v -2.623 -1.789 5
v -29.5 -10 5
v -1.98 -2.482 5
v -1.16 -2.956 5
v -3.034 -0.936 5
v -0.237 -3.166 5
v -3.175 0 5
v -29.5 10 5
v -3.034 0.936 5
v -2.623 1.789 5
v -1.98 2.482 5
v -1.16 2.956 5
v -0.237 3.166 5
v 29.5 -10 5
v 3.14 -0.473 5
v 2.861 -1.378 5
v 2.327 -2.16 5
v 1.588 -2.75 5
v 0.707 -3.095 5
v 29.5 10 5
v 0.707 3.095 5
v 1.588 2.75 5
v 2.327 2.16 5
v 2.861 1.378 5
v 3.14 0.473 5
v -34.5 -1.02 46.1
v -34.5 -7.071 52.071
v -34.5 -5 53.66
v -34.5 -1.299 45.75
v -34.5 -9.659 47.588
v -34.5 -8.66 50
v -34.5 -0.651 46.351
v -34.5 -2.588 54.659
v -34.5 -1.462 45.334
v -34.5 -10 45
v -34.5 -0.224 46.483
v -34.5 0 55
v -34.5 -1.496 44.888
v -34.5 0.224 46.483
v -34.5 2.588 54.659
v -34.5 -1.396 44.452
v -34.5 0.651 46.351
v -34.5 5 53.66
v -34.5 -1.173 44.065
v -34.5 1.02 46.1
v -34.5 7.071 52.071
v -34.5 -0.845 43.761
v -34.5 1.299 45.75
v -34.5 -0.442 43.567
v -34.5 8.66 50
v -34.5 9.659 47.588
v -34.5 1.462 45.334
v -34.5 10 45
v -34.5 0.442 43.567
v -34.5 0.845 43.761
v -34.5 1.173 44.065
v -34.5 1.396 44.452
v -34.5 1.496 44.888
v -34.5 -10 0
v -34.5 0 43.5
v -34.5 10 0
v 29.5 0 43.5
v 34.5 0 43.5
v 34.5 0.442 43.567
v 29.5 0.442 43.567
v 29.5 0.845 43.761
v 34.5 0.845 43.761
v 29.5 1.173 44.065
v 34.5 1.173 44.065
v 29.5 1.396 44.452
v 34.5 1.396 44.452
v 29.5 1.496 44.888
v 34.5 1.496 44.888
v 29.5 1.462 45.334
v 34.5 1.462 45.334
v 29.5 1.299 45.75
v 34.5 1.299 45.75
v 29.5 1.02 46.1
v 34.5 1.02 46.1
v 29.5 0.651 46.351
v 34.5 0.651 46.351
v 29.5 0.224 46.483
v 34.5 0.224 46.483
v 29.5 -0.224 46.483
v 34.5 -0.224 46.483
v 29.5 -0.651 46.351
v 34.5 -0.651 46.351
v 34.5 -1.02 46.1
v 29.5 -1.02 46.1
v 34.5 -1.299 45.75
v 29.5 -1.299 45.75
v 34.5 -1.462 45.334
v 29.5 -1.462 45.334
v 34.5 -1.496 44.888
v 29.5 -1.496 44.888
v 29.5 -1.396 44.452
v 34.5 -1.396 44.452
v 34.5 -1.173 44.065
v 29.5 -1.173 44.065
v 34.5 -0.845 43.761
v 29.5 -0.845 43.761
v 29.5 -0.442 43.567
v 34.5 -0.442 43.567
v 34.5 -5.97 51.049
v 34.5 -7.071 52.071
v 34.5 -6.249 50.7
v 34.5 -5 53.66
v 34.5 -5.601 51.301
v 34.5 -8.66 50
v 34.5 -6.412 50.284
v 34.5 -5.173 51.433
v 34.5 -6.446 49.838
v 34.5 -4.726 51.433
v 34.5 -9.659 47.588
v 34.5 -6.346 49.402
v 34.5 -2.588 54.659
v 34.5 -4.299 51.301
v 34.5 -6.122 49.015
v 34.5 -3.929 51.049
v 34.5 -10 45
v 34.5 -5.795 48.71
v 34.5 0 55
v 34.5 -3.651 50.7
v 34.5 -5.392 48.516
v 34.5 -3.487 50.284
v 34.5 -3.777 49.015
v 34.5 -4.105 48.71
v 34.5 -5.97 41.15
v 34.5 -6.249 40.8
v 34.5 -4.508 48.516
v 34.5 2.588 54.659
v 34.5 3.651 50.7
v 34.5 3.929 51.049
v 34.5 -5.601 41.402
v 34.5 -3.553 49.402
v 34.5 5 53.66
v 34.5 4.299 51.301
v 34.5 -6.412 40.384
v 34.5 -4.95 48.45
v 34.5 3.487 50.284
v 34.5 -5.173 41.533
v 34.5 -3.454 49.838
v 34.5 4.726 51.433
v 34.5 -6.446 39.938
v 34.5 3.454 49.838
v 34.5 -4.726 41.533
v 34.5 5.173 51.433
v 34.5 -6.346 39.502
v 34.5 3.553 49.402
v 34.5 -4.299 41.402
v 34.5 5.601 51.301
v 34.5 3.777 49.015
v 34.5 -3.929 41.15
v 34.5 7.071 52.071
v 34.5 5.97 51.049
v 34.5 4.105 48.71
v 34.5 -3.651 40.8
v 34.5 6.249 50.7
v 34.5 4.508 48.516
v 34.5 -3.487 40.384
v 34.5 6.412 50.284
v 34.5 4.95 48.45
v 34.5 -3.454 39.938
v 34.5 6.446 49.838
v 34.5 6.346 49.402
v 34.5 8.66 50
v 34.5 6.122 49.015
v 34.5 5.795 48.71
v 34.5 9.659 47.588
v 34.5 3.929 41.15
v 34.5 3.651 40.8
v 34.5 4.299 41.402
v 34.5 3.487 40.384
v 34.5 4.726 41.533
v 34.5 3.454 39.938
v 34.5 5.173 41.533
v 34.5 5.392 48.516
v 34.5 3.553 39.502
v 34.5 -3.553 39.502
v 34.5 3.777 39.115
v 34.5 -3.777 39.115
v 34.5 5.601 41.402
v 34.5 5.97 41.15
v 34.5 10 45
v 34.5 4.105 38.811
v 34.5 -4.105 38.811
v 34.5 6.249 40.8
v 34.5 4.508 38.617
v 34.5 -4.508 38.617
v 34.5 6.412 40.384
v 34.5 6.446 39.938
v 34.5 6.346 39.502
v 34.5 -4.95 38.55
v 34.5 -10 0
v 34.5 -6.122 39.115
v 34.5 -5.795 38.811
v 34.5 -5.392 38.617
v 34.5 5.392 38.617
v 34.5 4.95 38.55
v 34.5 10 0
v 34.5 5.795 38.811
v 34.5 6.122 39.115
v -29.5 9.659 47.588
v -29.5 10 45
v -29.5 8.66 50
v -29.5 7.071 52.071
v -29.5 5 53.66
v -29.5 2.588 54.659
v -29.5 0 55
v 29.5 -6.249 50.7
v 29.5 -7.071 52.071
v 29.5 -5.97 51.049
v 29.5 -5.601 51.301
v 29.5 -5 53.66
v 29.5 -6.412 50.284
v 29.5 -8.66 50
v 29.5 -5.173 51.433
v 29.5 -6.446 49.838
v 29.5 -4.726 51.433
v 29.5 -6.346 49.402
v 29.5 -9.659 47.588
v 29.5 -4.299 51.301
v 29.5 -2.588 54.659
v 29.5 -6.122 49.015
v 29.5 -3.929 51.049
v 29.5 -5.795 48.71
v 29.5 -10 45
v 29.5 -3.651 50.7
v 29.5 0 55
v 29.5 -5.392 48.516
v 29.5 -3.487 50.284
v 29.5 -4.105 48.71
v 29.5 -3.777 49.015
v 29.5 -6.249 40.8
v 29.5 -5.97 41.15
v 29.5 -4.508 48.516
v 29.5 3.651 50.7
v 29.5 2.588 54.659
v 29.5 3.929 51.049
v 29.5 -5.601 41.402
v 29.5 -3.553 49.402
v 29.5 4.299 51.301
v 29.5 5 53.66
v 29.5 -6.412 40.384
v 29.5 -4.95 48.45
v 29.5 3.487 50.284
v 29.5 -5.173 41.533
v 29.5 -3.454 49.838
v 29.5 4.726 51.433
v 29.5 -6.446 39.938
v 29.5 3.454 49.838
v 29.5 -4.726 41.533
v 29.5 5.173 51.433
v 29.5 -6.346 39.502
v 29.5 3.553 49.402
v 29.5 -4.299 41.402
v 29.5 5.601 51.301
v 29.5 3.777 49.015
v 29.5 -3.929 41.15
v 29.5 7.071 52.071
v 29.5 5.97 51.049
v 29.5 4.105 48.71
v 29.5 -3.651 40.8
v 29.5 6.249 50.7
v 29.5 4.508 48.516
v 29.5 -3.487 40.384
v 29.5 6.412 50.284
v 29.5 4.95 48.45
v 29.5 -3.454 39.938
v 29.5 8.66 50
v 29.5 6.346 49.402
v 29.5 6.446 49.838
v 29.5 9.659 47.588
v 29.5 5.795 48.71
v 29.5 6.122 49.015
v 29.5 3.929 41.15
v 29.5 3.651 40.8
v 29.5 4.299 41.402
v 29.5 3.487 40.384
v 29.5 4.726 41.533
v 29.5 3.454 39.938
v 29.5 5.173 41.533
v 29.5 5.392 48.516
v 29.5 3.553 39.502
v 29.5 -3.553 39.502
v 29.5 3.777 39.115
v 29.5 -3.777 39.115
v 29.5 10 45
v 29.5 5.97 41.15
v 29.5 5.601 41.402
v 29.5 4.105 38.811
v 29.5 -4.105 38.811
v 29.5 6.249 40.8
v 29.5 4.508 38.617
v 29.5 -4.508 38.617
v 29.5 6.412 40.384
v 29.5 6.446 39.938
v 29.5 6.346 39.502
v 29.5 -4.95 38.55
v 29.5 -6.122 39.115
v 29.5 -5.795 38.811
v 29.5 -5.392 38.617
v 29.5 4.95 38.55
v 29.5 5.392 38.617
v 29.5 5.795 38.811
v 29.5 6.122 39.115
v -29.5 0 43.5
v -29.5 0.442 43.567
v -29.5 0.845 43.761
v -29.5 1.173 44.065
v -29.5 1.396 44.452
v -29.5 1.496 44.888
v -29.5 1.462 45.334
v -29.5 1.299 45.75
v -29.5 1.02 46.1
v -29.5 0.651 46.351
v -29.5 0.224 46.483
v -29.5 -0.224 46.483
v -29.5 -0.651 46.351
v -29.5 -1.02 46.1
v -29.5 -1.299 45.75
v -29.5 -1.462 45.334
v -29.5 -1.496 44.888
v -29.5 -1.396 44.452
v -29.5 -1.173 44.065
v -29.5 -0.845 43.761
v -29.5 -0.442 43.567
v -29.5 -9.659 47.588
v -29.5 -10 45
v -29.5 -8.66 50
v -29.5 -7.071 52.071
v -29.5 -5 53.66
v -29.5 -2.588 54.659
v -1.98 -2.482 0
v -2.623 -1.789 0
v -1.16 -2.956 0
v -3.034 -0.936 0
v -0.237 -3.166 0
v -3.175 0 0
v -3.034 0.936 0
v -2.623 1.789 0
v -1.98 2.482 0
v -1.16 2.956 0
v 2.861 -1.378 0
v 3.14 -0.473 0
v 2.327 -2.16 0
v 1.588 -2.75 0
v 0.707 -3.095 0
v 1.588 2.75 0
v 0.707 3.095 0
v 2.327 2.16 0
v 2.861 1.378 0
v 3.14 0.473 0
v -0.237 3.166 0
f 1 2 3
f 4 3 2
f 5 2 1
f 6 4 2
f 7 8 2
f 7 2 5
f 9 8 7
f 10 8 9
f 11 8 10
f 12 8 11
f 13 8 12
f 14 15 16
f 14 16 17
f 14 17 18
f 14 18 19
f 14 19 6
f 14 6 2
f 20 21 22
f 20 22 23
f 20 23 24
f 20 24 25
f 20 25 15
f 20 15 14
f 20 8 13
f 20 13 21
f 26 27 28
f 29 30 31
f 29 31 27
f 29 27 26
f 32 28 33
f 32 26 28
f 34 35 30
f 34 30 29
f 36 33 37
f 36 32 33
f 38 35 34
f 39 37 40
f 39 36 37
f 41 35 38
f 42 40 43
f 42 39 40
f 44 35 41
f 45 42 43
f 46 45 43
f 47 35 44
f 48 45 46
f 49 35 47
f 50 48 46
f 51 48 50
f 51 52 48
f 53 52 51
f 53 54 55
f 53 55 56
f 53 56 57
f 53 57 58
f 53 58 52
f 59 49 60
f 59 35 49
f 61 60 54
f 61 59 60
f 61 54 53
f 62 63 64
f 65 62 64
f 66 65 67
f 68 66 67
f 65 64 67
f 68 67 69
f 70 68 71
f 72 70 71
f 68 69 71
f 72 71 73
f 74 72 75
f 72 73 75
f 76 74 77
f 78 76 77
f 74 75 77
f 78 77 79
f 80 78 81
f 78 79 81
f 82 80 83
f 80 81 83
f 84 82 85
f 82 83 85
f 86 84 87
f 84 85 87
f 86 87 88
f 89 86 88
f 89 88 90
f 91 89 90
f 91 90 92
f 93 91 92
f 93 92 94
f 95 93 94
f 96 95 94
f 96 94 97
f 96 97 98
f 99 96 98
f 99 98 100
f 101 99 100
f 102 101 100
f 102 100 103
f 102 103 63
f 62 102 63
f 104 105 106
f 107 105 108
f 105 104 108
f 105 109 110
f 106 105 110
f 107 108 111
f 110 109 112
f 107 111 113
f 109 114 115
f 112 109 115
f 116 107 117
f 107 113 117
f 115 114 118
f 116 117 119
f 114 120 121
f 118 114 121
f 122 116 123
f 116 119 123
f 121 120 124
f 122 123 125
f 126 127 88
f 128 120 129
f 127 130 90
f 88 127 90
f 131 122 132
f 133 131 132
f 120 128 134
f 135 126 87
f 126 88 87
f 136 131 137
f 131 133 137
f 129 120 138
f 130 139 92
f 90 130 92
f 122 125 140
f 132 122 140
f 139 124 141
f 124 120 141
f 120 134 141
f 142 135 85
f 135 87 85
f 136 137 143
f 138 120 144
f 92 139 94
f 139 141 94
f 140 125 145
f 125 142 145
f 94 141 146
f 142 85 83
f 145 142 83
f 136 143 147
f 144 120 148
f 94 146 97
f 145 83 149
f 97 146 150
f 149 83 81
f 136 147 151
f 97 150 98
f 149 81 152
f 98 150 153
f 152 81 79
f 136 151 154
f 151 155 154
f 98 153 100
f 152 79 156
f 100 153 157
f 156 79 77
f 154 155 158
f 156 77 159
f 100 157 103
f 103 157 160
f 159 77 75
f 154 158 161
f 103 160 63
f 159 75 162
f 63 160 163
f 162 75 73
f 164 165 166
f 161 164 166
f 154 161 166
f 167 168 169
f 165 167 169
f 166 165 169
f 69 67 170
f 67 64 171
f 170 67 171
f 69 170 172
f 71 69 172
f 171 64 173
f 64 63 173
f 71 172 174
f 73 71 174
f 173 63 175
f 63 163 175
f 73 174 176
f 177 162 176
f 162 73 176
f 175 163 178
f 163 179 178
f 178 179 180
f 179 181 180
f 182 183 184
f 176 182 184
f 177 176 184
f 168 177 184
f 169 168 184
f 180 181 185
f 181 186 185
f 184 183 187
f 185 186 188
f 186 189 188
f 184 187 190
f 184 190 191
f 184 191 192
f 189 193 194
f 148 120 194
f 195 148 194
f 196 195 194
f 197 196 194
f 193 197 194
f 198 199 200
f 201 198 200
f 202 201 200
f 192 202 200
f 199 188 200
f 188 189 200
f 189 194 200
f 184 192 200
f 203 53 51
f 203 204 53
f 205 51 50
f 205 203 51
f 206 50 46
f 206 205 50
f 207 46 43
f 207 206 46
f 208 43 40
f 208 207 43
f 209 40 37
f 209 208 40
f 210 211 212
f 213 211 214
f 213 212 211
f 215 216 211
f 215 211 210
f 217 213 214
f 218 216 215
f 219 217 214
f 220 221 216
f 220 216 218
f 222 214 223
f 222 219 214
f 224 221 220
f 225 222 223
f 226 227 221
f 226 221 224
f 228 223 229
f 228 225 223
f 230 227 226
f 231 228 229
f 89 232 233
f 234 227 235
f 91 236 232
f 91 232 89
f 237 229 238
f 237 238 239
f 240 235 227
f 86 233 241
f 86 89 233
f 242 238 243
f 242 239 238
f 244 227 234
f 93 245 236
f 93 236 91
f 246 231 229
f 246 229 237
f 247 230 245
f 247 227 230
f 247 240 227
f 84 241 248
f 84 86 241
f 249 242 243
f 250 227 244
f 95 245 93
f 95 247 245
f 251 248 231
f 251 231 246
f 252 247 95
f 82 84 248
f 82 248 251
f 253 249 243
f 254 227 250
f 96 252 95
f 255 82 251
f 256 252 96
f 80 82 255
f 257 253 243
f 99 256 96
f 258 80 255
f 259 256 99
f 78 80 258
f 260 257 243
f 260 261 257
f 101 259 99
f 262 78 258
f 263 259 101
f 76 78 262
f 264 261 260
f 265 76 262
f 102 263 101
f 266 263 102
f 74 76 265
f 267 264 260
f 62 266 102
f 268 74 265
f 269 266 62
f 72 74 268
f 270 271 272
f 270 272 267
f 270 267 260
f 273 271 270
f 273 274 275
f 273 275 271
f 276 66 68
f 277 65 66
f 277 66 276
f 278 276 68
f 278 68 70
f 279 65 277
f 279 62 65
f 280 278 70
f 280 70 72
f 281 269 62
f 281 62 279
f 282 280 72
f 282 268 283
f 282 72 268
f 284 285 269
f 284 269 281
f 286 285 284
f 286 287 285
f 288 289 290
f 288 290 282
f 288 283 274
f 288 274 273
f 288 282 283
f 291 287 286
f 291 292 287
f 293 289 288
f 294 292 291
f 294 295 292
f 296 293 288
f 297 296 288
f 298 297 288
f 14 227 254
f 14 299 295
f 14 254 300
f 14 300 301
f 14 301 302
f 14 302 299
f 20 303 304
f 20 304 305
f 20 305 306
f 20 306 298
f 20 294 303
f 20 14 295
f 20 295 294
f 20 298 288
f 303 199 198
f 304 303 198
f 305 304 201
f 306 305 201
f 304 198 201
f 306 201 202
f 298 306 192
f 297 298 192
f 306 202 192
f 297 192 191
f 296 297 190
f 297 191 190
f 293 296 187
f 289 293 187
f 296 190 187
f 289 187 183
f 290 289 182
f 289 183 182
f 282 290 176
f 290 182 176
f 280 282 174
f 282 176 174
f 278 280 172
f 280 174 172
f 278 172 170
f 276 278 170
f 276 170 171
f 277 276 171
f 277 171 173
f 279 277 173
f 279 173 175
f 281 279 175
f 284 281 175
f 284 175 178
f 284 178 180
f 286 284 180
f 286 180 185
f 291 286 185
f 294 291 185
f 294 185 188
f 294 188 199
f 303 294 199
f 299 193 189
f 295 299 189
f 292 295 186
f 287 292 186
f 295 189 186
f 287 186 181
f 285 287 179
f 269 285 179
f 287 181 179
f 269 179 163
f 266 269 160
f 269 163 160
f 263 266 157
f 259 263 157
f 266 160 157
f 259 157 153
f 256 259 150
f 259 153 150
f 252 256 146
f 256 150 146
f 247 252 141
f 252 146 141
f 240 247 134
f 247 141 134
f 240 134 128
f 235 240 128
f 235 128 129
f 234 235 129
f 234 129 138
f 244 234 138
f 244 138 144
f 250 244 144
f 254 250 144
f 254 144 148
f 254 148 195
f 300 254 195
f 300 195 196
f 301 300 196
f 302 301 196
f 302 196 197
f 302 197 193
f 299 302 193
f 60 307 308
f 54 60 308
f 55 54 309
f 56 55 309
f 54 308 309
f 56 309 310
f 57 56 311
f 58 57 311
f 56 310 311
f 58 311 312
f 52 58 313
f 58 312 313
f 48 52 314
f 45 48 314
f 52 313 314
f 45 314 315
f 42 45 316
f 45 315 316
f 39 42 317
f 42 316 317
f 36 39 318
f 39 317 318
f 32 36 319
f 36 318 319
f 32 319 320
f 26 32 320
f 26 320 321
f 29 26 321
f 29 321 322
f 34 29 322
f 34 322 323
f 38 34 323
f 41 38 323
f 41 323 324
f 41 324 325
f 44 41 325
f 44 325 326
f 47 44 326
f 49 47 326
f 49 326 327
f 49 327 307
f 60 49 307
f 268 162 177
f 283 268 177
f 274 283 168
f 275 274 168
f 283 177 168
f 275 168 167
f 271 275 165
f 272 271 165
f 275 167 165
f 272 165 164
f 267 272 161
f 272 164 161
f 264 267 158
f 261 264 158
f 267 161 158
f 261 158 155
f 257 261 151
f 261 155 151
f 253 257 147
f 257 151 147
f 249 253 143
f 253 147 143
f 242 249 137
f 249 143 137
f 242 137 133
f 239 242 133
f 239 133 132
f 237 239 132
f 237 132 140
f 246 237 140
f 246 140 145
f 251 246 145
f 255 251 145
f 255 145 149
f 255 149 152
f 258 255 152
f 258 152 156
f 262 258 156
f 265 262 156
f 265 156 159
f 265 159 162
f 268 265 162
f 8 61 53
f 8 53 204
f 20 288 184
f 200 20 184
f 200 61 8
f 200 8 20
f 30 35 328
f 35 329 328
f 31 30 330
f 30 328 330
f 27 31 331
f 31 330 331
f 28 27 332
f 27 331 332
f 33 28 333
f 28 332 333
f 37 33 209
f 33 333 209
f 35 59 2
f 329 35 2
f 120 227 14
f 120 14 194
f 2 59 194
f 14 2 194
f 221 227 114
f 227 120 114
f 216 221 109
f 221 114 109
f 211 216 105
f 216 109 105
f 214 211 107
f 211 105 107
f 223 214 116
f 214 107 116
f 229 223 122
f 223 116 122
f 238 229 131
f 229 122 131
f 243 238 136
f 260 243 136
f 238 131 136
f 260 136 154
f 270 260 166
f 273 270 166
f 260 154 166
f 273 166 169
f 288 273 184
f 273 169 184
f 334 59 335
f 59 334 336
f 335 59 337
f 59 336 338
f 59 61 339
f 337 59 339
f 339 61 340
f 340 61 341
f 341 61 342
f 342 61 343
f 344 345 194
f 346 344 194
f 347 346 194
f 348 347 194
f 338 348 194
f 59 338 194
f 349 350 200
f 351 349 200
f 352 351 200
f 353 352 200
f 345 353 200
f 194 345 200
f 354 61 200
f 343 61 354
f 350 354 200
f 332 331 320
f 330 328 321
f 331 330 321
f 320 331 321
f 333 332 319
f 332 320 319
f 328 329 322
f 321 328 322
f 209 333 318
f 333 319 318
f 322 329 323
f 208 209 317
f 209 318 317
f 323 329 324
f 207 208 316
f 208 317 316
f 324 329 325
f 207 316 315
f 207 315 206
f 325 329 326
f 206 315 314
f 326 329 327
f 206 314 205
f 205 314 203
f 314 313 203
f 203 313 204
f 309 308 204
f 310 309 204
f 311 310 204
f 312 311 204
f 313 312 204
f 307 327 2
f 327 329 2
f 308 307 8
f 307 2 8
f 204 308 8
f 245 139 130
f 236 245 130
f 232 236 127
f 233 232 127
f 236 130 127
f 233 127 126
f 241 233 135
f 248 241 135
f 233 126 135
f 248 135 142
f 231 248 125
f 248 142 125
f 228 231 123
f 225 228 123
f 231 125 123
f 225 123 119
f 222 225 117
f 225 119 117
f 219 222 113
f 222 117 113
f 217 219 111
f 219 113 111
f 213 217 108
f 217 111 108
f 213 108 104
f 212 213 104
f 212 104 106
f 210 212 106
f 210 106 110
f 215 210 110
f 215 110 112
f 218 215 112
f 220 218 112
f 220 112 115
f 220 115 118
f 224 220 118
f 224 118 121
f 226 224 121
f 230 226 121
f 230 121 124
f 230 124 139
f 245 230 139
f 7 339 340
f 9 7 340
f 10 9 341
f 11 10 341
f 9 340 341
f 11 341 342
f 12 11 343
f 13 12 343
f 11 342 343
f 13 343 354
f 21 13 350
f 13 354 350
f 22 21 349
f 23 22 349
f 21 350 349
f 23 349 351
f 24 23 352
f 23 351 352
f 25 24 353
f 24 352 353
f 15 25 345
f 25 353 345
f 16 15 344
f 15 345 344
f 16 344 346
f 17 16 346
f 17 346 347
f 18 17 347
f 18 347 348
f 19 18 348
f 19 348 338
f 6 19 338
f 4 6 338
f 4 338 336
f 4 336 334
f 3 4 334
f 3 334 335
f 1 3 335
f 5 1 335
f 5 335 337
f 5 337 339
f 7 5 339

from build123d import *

# Parameters (mm, degrees)
SKETCH_1_W          = 69
SKETCH_1_H          = 20
EXTRUDE_1_DEPTH     = 5
SKETCH_2_W          = 5
SKETCH_2_H          = 20
EXTRUDE_2_DEPTH     = 50
FILLET_1_R          = 10
SKETCH_3_R          = 1.5
CUT_EXTRUDE_1_DEPTH = 82
SKETCH_4_R          = 1.5
CUT_EXTRUDE_2_DEPTH = 10
SKETCH_5_R          = 3.175
CUT_EXTRUDE_3_DEPTH = 10


with BuildPart() as part:
    # 草图1 → 凸台-拉伸1 (new body)
    with BuildSketch(Plane.XY):
        Rectangle(SKETCH_1_W, SKETCH_1_H)
    extrude(amount=EXTRUDE_1_DEPTH)

    # 草图2 → 凸台-拉伸2 (add)
    with BuildSketch(Plane.XY.offset(5)):
        with Locations((-32, 0)):
            Rectangle(SKETCH_2_W, SKETCH_2_H)
        with Locations((32, 0)):
            Rectangle(SKETCH_2_W, SKETCH_2_H)
    extrude(amount=EXTRUDE_2_DEPTH)

    # 圆角1
    fillet_1_edges = [part.edges().sort_by_distance(p)[0] for p in [
        (-32, -10, 55),
        (-32, 10, 55),
        (32, 10, 55),
        (32, -10, 55),
    ]]
    fillet(fillet_1_edges, radius=FILLET_1_R - 0.0001)  # a hair under: the kernel refuses the full size

    # 草图3 → 切除-拉伸1 (cut)
    with BuildSketch(Plane(origin=(34.5, 0, 0), x_dir=(0, 0, -1), z_dir=(1, 0, 0))):
        with Locations((-45, 0)):
            Circle(SKETCH_3_R)
    extrude(amount=-CUT_EXTRUDE_1_DEPTH, mode=Mode.SUBTRACT)

    # 草图4 → 切除-拉伸2 (cut)
    with BuildSketch(Plane(origin=(34.5, 0, 0), x_dir=(0, 0, -1), z_dir=(1, 0, 0))):
        with Locations((-49.949747468, 4.949747468)):
            Circle(SKETCH_4_R)
        with Locations((-40.050252532, 4.949747468)):
            Circle(SKETCH_4_R)
        with Locations((-40.050252532, -4.949747468)):
            Circle(SKETCH_4_R)
        with Locations((-49.949747468, -4.949747468)):
            Circle(SKETCH_4_R)
    extrude(amount=-CUT_EXTRUDE_2_DEPTH, mode=Mode.SUBTRACT)

    # 草图5 → 切除-拉伸3 (cut)
    with BuildSketch(Plane(origin=(0, 0, 0), x_dir=(-1, 0, 0), z_dir=(0, 0, -1))):
        Circle(SKETCH_5_R)
    extrude(amount=-CUT_EXTRUDE_3_DEPTH, mode=Mode.SUBTRACT)


solid = part.part
